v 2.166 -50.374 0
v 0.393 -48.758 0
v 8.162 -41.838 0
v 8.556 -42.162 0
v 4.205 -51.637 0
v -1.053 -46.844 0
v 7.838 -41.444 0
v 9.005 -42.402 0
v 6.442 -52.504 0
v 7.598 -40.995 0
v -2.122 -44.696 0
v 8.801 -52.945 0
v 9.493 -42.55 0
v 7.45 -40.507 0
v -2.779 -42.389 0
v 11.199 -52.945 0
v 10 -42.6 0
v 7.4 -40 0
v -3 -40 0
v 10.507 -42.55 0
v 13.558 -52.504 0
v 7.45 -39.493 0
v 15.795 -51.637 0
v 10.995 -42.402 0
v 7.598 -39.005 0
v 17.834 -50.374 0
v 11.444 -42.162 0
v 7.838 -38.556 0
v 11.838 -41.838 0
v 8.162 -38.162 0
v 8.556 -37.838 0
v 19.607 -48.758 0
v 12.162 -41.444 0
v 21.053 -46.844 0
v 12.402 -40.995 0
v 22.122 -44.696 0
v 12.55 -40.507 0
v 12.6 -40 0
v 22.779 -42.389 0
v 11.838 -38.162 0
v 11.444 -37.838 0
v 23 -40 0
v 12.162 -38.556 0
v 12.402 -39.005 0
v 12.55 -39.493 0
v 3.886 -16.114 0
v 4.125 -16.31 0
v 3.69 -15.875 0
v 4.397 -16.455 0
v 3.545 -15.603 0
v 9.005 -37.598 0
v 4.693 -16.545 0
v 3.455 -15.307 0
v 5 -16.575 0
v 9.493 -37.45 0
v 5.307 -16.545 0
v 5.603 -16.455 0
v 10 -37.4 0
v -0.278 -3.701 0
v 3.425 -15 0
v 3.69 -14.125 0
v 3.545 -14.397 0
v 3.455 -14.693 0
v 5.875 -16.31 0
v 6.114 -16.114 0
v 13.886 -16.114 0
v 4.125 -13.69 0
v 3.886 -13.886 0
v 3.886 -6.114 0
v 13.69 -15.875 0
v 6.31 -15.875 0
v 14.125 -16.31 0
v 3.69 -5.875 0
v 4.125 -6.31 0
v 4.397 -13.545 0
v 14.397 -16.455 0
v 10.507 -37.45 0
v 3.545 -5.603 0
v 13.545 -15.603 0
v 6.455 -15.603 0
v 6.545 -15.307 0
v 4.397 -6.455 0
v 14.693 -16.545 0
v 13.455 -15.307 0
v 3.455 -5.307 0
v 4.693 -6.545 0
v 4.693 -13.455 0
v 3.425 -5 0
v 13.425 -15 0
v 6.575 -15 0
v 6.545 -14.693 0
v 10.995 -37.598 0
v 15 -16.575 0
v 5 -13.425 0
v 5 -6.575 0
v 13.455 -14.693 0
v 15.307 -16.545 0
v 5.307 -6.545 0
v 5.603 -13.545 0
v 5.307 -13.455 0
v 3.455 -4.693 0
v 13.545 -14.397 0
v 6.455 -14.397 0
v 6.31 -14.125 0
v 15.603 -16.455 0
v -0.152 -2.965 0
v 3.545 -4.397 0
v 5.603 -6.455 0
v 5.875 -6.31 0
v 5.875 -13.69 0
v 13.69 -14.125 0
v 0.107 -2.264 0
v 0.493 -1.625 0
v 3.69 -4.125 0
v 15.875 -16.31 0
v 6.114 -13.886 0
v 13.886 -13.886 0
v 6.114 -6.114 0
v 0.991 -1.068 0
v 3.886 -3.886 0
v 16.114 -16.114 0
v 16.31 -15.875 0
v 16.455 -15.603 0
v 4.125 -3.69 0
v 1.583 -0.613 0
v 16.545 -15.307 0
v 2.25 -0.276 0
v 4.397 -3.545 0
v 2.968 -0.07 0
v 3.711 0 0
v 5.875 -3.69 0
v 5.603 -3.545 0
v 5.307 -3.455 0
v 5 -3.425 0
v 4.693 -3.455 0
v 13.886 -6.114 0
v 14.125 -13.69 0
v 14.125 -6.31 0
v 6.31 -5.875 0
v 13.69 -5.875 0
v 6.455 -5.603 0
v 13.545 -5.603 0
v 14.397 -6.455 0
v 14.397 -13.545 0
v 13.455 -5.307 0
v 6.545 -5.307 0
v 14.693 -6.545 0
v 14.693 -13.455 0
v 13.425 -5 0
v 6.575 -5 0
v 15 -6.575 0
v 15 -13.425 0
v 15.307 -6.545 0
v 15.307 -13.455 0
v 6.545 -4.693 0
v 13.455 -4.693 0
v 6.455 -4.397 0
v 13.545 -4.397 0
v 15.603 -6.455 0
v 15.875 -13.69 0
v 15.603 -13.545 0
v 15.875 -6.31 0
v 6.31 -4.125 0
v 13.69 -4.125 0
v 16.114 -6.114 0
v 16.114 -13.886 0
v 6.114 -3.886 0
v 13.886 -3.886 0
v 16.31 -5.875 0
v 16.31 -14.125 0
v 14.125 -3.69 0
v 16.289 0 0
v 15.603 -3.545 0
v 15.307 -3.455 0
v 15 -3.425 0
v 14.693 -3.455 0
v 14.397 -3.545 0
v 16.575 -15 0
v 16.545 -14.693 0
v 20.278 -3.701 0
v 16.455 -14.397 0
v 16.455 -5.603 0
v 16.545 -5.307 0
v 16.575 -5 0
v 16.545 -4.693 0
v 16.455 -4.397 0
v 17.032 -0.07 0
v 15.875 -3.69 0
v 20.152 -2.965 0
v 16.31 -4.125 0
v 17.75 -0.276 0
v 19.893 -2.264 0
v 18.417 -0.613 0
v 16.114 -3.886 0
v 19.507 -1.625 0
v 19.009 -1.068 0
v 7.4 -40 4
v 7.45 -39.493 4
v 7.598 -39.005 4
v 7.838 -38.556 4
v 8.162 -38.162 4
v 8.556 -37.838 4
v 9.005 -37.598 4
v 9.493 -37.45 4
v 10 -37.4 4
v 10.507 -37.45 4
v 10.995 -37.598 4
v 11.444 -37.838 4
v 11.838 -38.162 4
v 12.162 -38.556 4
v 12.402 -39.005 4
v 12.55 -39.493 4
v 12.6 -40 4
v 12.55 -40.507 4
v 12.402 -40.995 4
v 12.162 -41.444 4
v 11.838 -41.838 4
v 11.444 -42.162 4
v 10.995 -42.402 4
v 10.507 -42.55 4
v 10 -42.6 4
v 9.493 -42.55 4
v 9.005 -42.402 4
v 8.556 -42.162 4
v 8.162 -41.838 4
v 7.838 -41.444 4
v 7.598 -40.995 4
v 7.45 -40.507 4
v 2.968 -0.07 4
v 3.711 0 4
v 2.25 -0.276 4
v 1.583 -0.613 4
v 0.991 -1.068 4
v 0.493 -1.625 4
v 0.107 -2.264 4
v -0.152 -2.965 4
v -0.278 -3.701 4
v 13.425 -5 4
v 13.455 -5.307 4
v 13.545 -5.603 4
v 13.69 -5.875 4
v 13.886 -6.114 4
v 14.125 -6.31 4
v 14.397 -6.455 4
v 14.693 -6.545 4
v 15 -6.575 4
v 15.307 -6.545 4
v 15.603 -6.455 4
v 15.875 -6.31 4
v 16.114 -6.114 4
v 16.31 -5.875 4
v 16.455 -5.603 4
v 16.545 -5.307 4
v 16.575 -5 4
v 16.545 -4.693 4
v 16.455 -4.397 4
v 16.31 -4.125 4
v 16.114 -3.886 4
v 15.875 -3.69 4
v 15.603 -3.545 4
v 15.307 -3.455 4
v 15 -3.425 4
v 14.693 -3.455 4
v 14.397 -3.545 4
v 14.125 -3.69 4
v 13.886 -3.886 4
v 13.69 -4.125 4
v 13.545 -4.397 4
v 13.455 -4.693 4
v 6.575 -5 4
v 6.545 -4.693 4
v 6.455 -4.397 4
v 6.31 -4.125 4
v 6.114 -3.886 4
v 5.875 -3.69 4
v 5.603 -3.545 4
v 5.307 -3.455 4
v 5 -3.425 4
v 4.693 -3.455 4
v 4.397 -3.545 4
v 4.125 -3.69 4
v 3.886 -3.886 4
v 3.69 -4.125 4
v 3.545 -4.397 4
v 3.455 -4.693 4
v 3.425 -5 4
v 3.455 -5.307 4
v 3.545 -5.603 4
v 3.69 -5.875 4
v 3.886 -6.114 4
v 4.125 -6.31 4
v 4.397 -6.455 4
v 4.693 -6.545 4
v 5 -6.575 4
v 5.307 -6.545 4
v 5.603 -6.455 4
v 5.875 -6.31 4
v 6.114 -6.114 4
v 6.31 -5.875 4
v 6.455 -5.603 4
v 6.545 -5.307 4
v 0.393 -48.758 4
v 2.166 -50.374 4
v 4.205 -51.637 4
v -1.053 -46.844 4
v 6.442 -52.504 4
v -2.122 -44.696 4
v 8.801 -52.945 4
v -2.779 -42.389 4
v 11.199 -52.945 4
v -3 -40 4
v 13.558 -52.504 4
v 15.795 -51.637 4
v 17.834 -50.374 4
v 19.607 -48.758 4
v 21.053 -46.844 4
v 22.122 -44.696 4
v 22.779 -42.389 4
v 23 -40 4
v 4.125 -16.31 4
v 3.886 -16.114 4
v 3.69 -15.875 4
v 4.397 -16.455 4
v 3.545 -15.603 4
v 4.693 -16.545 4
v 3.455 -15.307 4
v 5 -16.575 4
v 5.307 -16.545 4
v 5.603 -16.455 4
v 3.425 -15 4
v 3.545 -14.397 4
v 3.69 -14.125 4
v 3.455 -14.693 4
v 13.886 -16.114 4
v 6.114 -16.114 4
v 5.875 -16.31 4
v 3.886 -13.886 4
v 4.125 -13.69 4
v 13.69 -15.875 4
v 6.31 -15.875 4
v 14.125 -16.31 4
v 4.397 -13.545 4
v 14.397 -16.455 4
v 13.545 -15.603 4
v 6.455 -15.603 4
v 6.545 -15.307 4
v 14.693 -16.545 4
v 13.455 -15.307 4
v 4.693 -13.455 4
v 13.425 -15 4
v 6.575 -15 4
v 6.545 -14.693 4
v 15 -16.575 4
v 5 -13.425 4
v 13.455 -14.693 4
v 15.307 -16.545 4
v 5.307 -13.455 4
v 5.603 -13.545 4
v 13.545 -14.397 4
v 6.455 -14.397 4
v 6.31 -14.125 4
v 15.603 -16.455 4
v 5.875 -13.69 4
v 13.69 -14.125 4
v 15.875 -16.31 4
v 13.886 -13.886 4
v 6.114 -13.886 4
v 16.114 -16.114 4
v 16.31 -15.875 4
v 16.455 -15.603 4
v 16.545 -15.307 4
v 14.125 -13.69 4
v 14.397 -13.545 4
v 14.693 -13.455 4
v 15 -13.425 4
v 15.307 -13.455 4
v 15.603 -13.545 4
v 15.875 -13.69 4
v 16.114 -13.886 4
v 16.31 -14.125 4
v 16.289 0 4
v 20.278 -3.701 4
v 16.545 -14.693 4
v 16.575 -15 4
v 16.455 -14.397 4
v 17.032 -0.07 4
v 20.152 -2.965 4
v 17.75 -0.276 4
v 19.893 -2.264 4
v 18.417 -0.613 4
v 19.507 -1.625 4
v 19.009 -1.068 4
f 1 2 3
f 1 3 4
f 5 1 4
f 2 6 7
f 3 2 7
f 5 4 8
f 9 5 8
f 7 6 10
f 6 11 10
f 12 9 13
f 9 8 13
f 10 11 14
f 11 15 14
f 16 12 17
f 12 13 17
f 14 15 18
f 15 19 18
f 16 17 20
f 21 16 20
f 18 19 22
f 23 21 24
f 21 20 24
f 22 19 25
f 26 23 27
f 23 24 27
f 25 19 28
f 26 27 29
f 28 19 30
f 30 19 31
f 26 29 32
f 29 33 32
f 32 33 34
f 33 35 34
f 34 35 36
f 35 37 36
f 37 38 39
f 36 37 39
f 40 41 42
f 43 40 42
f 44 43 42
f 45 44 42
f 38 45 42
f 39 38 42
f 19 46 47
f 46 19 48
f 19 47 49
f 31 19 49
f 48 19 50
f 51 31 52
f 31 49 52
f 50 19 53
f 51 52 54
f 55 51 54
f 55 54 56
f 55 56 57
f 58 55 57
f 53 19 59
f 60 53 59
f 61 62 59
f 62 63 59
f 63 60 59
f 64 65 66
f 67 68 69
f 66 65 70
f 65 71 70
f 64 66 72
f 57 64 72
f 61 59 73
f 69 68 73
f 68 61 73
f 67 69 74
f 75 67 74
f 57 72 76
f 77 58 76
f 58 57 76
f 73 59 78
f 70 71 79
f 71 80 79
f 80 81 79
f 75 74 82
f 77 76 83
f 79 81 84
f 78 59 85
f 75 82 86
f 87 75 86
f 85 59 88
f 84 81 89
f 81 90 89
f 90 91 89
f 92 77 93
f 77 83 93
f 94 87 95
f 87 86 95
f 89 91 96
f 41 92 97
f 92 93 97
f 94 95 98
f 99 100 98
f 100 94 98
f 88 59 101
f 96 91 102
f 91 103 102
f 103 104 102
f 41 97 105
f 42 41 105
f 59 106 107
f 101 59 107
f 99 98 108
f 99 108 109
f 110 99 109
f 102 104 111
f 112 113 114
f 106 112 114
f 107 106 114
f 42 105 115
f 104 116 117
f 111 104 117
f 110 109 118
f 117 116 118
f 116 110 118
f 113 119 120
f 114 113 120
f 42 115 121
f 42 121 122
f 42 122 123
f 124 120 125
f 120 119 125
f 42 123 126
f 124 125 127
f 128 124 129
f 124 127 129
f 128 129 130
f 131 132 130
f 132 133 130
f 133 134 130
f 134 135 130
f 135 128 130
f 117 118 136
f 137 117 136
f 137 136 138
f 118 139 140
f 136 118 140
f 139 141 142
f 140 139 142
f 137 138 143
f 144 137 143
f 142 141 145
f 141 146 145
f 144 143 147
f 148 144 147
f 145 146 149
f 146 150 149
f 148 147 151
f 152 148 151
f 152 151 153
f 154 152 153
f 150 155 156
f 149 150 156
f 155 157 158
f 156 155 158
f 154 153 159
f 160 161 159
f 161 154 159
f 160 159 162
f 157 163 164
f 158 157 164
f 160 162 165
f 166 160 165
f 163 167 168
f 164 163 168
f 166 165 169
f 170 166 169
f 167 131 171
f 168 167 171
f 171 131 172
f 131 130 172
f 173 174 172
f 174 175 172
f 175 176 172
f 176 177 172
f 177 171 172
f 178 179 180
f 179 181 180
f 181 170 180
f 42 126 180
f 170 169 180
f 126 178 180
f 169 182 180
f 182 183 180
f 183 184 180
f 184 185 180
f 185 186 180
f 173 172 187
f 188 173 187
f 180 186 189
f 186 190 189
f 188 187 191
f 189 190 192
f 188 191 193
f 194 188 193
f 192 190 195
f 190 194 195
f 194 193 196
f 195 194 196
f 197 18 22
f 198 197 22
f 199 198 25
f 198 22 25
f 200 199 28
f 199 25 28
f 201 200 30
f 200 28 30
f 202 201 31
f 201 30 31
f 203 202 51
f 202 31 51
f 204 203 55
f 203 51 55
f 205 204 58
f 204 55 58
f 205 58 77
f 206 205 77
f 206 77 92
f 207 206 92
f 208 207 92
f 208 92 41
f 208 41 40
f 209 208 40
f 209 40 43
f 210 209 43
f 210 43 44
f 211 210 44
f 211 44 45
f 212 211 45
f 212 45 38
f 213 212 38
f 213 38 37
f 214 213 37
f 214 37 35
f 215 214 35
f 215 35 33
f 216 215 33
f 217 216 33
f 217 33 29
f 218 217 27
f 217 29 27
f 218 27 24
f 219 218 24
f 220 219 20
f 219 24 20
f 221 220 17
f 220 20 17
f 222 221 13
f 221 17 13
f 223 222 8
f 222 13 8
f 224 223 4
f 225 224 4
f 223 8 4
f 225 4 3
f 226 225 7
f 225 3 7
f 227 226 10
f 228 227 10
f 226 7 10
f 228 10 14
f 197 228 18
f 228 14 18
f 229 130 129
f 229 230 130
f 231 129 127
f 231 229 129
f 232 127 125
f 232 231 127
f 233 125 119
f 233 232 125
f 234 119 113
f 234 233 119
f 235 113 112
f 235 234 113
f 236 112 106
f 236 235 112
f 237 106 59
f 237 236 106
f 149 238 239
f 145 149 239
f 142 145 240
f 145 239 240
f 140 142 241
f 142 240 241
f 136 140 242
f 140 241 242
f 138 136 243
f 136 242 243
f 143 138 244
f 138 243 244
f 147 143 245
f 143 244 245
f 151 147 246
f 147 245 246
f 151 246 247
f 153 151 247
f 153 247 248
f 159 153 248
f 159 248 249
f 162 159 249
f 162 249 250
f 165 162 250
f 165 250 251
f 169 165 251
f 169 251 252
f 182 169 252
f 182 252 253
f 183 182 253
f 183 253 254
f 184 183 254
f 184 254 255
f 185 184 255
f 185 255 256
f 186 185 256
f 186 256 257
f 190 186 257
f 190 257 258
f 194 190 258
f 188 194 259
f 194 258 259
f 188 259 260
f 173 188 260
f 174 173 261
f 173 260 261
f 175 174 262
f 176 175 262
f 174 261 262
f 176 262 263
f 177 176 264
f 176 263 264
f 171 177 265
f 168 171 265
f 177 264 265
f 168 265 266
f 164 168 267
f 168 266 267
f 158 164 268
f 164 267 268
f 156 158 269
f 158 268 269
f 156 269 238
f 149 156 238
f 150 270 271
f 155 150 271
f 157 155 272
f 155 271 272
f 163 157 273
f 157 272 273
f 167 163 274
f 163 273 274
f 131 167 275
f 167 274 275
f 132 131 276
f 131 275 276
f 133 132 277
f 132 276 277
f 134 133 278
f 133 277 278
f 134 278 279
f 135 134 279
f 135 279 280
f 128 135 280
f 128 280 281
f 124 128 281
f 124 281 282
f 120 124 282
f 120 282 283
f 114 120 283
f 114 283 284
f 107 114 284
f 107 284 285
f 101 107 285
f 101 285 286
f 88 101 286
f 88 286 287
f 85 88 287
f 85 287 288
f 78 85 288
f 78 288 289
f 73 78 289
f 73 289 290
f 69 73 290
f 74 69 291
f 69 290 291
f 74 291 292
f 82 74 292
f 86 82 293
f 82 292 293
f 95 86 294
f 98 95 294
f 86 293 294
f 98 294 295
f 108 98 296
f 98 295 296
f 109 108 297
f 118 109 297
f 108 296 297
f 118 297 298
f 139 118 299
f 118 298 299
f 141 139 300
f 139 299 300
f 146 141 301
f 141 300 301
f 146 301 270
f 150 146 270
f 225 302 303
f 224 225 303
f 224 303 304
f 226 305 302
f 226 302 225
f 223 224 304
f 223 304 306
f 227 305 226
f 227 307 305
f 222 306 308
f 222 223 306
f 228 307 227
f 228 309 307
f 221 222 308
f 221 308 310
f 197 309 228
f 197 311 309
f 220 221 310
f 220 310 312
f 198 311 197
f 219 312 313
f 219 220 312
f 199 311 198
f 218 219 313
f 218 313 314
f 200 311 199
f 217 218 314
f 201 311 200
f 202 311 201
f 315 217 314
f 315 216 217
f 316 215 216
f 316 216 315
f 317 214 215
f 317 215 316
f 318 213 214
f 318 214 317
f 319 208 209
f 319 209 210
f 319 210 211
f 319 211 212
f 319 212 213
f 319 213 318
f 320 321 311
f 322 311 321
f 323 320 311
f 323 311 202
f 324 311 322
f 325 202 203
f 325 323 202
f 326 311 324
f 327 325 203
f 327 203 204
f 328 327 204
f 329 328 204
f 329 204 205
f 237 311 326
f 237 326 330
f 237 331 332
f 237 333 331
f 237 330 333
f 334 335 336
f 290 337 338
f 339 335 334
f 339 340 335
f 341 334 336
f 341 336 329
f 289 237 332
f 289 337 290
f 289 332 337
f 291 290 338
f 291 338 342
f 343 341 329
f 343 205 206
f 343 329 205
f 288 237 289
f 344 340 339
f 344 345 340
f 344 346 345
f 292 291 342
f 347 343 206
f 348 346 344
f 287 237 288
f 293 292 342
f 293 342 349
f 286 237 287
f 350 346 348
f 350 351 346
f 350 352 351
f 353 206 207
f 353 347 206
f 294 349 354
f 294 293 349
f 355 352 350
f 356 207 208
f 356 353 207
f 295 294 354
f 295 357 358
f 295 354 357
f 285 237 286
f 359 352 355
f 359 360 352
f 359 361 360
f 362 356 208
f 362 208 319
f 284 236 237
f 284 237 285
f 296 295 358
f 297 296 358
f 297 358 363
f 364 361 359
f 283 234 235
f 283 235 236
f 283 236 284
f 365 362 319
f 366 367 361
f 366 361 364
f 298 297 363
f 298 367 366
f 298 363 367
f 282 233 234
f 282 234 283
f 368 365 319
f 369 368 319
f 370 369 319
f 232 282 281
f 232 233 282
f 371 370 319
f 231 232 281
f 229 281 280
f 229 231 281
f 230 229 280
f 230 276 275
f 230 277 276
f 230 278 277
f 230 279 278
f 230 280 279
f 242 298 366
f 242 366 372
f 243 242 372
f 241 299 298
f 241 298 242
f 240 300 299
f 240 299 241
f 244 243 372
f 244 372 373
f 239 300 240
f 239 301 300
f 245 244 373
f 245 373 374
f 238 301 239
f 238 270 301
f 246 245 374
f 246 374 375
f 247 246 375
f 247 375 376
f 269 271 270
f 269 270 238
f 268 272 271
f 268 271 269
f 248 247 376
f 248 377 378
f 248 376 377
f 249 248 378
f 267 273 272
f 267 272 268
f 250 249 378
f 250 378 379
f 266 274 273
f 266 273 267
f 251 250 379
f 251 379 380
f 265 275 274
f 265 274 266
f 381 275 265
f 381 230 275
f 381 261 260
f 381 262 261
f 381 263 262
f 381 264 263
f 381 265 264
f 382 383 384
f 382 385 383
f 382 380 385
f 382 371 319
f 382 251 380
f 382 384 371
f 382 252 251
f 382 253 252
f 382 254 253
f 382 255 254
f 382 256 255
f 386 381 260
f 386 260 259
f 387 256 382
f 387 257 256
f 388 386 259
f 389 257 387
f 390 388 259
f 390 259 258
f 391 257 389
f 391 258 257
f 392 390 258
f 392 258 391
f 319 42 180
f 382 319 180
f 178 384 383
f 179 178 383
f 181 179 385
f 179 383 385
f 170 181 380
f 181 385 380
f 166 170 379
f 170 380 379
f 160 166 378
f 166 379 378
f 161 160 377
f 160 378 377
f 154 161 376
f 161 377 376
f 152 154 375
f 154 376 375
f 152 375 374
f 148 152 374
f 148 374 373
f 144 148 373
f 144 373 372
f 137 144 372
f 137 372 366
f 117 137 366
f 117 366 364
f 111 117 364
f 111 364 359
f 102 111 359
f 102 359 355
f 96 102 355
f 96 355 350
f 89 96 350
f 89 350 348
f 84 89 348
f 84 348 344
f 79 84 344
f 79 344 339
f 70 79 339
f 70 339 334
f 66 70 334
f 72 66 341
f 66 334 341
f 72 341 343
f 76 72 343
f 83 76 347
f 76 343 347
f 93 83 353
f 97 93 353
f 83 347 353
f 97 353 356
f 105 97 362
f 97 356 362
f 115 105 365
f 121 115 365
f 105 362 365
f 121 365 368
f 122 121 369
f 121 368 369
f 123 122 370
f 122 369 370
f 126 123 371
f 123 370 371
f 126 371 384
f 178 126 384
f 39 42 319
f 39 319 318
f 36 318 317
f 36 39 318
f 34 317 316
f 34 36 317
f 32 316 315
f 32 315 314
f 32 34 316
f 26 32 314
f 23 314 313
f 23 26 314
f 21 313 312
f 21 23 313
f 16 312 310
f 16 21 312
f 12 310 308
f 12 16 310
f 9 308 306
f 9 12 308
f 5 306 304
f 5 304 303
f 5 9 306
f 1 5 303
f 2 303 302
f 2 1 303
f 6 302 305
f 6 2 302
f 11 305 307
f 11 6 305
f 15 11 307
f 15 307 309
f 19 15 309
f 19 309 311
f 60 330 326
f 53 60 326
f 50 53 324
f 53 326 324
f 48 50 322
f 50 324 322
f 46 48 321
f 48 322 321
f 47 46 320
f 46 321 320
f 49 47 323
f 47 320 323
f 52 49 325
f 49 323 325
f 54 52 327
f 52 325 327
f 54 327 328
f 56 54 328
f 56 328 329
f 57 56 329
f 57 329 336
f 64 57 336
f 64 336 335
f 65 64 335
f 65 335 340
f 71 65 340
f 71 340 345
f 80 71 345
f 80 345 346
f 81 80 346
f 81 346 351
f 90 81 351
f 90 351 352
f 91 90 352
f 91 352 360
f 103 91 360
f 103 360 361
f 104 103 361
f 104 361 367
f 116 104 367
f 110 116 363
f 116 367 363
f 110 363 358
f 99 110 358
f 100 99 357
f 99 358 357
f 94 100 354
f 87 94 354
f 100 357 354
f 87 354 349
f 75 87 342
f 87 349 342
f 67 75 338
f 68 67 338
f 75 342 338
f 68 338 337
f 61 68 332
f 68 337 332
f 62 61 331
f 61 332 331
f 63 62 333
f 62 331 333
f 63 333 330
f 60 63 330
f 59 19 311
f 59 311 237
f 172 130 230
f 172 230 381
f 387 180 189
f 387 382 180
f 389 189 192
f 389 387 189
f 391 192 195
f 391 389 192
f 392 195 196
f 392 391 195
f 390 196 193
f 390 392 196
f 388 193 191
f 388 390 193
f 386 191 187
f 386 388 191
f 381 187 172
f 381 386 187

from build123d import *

# Parameters (mm, degrees)
SKETCH_1_W          = 20
SKETCH_1_H          = 40
EXTRUDE_1_DEPTH     = 4
SKETCH_5_R          = 1.575
CUT_EXTRUDE_2_DEPTH = 45.899888641
EXTRUDE_2_DEPTH     = 4
SKETCH_11_R         = 2.6
CUT_EXTRUDE_3_DEPTH = 58.913728942
FILLET_1_R          = 4


with BuildPart() as part:
    # 草图1 → 凸台-拉伸1 (new body)
    with BuildSketch(Plane.XY):
        with Locations((10, -20)):
            Rectangle(SKETCH_1_W, SKETCH_1_H)
    extrude(amount=EXTRUDE_1_DEPTH)

    # 草图5 → 切除-拉伸2 (cut, through all)
    with BuildSketch(Plane.XY.offset(4)):
        with Locations((5, -5)):
            Circle(SKETCH_5_R)
        with Locations(Location((15, -5, 0), (0, 0, 180))):
            Circle(SKETCH_5_R)
        with Locations((15, -15)):
            Circle(SKETCH_5_R)
        with Locations(Location((5, -15, 0), (0, 0, 180))):
            Circle(SKETCH_5_R)
    extrude(amount=-CUT_EXTRUDE_2_DEPTH, mode=Mode.SUBTRACT)

    # 草图10 → 凸台-拉伸2 (add)
    with BuildSketch(Plane(origin=(0, 0, 0), x_dir=(-1, 0, 0), z_dir=(0, 0, -1))):
        Polygon((-23, -40), (-20, 0), (-20, -40), align=None)
        Polygon((0, -40), (3, -40), (0, 0), align=None)
        with BuildLine():
            Line((0, -40), (-20, -40))
            Line((-20, -40), (-23, -40))
            ThreePointArc((-23, -40), (-10, -53), (3, -40))
            Line((3, -40), (0, -40))
        make_face()
    extrude(amount=-EXTRUDE_2_DEPTH)

    # 草图11 → 切除-拉伸3 (cut, through all)
    with BuildSketch(Plane(origin=(0, 0, 0), x_dir=(-1, 0, 0), z_dir=(0, 0, -1))):
        with Locations((-10, -40)):
            Circle(SKETCH_11_R)
    extrude(amount=-CUT_EXTRUDE_3_DEPTH, mode=Mode.SUBTRACT)

    # 圆角1
    fillet_1_edges = [part.edges().sort_by_distance(p)[0] for p in [
        (0, 0, 2),
        (20, 0, 2),
    ]]
    fillet(fillet_1_edges, radius=FILLET_1_R)


solid = part.part
